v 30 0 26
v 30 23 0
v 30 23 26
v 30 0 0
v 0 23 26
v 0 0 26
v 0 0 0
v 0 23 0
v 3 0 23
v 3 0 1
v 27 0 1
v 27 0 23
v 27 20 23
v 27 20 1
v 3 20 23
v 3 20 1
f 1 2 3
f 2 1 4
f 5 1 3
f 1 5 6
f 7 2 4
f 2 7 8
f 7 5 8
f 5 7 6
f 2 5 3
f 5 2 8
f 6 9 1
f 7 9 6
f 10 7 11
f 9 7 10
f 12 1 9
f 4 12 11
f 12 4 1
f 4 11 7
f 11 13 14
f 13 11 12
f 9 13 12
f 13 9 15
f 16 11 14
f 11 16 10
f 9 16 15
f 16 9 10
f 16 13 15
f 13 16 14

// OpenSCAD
BackLed();

module BackLed(){
    
    // Main
    color("red")
    difference() {
        translate([0,0,0])
        cube([30,23,26]);
        translate([3,0,1])
        cube([24,20,22]);
    }
}
